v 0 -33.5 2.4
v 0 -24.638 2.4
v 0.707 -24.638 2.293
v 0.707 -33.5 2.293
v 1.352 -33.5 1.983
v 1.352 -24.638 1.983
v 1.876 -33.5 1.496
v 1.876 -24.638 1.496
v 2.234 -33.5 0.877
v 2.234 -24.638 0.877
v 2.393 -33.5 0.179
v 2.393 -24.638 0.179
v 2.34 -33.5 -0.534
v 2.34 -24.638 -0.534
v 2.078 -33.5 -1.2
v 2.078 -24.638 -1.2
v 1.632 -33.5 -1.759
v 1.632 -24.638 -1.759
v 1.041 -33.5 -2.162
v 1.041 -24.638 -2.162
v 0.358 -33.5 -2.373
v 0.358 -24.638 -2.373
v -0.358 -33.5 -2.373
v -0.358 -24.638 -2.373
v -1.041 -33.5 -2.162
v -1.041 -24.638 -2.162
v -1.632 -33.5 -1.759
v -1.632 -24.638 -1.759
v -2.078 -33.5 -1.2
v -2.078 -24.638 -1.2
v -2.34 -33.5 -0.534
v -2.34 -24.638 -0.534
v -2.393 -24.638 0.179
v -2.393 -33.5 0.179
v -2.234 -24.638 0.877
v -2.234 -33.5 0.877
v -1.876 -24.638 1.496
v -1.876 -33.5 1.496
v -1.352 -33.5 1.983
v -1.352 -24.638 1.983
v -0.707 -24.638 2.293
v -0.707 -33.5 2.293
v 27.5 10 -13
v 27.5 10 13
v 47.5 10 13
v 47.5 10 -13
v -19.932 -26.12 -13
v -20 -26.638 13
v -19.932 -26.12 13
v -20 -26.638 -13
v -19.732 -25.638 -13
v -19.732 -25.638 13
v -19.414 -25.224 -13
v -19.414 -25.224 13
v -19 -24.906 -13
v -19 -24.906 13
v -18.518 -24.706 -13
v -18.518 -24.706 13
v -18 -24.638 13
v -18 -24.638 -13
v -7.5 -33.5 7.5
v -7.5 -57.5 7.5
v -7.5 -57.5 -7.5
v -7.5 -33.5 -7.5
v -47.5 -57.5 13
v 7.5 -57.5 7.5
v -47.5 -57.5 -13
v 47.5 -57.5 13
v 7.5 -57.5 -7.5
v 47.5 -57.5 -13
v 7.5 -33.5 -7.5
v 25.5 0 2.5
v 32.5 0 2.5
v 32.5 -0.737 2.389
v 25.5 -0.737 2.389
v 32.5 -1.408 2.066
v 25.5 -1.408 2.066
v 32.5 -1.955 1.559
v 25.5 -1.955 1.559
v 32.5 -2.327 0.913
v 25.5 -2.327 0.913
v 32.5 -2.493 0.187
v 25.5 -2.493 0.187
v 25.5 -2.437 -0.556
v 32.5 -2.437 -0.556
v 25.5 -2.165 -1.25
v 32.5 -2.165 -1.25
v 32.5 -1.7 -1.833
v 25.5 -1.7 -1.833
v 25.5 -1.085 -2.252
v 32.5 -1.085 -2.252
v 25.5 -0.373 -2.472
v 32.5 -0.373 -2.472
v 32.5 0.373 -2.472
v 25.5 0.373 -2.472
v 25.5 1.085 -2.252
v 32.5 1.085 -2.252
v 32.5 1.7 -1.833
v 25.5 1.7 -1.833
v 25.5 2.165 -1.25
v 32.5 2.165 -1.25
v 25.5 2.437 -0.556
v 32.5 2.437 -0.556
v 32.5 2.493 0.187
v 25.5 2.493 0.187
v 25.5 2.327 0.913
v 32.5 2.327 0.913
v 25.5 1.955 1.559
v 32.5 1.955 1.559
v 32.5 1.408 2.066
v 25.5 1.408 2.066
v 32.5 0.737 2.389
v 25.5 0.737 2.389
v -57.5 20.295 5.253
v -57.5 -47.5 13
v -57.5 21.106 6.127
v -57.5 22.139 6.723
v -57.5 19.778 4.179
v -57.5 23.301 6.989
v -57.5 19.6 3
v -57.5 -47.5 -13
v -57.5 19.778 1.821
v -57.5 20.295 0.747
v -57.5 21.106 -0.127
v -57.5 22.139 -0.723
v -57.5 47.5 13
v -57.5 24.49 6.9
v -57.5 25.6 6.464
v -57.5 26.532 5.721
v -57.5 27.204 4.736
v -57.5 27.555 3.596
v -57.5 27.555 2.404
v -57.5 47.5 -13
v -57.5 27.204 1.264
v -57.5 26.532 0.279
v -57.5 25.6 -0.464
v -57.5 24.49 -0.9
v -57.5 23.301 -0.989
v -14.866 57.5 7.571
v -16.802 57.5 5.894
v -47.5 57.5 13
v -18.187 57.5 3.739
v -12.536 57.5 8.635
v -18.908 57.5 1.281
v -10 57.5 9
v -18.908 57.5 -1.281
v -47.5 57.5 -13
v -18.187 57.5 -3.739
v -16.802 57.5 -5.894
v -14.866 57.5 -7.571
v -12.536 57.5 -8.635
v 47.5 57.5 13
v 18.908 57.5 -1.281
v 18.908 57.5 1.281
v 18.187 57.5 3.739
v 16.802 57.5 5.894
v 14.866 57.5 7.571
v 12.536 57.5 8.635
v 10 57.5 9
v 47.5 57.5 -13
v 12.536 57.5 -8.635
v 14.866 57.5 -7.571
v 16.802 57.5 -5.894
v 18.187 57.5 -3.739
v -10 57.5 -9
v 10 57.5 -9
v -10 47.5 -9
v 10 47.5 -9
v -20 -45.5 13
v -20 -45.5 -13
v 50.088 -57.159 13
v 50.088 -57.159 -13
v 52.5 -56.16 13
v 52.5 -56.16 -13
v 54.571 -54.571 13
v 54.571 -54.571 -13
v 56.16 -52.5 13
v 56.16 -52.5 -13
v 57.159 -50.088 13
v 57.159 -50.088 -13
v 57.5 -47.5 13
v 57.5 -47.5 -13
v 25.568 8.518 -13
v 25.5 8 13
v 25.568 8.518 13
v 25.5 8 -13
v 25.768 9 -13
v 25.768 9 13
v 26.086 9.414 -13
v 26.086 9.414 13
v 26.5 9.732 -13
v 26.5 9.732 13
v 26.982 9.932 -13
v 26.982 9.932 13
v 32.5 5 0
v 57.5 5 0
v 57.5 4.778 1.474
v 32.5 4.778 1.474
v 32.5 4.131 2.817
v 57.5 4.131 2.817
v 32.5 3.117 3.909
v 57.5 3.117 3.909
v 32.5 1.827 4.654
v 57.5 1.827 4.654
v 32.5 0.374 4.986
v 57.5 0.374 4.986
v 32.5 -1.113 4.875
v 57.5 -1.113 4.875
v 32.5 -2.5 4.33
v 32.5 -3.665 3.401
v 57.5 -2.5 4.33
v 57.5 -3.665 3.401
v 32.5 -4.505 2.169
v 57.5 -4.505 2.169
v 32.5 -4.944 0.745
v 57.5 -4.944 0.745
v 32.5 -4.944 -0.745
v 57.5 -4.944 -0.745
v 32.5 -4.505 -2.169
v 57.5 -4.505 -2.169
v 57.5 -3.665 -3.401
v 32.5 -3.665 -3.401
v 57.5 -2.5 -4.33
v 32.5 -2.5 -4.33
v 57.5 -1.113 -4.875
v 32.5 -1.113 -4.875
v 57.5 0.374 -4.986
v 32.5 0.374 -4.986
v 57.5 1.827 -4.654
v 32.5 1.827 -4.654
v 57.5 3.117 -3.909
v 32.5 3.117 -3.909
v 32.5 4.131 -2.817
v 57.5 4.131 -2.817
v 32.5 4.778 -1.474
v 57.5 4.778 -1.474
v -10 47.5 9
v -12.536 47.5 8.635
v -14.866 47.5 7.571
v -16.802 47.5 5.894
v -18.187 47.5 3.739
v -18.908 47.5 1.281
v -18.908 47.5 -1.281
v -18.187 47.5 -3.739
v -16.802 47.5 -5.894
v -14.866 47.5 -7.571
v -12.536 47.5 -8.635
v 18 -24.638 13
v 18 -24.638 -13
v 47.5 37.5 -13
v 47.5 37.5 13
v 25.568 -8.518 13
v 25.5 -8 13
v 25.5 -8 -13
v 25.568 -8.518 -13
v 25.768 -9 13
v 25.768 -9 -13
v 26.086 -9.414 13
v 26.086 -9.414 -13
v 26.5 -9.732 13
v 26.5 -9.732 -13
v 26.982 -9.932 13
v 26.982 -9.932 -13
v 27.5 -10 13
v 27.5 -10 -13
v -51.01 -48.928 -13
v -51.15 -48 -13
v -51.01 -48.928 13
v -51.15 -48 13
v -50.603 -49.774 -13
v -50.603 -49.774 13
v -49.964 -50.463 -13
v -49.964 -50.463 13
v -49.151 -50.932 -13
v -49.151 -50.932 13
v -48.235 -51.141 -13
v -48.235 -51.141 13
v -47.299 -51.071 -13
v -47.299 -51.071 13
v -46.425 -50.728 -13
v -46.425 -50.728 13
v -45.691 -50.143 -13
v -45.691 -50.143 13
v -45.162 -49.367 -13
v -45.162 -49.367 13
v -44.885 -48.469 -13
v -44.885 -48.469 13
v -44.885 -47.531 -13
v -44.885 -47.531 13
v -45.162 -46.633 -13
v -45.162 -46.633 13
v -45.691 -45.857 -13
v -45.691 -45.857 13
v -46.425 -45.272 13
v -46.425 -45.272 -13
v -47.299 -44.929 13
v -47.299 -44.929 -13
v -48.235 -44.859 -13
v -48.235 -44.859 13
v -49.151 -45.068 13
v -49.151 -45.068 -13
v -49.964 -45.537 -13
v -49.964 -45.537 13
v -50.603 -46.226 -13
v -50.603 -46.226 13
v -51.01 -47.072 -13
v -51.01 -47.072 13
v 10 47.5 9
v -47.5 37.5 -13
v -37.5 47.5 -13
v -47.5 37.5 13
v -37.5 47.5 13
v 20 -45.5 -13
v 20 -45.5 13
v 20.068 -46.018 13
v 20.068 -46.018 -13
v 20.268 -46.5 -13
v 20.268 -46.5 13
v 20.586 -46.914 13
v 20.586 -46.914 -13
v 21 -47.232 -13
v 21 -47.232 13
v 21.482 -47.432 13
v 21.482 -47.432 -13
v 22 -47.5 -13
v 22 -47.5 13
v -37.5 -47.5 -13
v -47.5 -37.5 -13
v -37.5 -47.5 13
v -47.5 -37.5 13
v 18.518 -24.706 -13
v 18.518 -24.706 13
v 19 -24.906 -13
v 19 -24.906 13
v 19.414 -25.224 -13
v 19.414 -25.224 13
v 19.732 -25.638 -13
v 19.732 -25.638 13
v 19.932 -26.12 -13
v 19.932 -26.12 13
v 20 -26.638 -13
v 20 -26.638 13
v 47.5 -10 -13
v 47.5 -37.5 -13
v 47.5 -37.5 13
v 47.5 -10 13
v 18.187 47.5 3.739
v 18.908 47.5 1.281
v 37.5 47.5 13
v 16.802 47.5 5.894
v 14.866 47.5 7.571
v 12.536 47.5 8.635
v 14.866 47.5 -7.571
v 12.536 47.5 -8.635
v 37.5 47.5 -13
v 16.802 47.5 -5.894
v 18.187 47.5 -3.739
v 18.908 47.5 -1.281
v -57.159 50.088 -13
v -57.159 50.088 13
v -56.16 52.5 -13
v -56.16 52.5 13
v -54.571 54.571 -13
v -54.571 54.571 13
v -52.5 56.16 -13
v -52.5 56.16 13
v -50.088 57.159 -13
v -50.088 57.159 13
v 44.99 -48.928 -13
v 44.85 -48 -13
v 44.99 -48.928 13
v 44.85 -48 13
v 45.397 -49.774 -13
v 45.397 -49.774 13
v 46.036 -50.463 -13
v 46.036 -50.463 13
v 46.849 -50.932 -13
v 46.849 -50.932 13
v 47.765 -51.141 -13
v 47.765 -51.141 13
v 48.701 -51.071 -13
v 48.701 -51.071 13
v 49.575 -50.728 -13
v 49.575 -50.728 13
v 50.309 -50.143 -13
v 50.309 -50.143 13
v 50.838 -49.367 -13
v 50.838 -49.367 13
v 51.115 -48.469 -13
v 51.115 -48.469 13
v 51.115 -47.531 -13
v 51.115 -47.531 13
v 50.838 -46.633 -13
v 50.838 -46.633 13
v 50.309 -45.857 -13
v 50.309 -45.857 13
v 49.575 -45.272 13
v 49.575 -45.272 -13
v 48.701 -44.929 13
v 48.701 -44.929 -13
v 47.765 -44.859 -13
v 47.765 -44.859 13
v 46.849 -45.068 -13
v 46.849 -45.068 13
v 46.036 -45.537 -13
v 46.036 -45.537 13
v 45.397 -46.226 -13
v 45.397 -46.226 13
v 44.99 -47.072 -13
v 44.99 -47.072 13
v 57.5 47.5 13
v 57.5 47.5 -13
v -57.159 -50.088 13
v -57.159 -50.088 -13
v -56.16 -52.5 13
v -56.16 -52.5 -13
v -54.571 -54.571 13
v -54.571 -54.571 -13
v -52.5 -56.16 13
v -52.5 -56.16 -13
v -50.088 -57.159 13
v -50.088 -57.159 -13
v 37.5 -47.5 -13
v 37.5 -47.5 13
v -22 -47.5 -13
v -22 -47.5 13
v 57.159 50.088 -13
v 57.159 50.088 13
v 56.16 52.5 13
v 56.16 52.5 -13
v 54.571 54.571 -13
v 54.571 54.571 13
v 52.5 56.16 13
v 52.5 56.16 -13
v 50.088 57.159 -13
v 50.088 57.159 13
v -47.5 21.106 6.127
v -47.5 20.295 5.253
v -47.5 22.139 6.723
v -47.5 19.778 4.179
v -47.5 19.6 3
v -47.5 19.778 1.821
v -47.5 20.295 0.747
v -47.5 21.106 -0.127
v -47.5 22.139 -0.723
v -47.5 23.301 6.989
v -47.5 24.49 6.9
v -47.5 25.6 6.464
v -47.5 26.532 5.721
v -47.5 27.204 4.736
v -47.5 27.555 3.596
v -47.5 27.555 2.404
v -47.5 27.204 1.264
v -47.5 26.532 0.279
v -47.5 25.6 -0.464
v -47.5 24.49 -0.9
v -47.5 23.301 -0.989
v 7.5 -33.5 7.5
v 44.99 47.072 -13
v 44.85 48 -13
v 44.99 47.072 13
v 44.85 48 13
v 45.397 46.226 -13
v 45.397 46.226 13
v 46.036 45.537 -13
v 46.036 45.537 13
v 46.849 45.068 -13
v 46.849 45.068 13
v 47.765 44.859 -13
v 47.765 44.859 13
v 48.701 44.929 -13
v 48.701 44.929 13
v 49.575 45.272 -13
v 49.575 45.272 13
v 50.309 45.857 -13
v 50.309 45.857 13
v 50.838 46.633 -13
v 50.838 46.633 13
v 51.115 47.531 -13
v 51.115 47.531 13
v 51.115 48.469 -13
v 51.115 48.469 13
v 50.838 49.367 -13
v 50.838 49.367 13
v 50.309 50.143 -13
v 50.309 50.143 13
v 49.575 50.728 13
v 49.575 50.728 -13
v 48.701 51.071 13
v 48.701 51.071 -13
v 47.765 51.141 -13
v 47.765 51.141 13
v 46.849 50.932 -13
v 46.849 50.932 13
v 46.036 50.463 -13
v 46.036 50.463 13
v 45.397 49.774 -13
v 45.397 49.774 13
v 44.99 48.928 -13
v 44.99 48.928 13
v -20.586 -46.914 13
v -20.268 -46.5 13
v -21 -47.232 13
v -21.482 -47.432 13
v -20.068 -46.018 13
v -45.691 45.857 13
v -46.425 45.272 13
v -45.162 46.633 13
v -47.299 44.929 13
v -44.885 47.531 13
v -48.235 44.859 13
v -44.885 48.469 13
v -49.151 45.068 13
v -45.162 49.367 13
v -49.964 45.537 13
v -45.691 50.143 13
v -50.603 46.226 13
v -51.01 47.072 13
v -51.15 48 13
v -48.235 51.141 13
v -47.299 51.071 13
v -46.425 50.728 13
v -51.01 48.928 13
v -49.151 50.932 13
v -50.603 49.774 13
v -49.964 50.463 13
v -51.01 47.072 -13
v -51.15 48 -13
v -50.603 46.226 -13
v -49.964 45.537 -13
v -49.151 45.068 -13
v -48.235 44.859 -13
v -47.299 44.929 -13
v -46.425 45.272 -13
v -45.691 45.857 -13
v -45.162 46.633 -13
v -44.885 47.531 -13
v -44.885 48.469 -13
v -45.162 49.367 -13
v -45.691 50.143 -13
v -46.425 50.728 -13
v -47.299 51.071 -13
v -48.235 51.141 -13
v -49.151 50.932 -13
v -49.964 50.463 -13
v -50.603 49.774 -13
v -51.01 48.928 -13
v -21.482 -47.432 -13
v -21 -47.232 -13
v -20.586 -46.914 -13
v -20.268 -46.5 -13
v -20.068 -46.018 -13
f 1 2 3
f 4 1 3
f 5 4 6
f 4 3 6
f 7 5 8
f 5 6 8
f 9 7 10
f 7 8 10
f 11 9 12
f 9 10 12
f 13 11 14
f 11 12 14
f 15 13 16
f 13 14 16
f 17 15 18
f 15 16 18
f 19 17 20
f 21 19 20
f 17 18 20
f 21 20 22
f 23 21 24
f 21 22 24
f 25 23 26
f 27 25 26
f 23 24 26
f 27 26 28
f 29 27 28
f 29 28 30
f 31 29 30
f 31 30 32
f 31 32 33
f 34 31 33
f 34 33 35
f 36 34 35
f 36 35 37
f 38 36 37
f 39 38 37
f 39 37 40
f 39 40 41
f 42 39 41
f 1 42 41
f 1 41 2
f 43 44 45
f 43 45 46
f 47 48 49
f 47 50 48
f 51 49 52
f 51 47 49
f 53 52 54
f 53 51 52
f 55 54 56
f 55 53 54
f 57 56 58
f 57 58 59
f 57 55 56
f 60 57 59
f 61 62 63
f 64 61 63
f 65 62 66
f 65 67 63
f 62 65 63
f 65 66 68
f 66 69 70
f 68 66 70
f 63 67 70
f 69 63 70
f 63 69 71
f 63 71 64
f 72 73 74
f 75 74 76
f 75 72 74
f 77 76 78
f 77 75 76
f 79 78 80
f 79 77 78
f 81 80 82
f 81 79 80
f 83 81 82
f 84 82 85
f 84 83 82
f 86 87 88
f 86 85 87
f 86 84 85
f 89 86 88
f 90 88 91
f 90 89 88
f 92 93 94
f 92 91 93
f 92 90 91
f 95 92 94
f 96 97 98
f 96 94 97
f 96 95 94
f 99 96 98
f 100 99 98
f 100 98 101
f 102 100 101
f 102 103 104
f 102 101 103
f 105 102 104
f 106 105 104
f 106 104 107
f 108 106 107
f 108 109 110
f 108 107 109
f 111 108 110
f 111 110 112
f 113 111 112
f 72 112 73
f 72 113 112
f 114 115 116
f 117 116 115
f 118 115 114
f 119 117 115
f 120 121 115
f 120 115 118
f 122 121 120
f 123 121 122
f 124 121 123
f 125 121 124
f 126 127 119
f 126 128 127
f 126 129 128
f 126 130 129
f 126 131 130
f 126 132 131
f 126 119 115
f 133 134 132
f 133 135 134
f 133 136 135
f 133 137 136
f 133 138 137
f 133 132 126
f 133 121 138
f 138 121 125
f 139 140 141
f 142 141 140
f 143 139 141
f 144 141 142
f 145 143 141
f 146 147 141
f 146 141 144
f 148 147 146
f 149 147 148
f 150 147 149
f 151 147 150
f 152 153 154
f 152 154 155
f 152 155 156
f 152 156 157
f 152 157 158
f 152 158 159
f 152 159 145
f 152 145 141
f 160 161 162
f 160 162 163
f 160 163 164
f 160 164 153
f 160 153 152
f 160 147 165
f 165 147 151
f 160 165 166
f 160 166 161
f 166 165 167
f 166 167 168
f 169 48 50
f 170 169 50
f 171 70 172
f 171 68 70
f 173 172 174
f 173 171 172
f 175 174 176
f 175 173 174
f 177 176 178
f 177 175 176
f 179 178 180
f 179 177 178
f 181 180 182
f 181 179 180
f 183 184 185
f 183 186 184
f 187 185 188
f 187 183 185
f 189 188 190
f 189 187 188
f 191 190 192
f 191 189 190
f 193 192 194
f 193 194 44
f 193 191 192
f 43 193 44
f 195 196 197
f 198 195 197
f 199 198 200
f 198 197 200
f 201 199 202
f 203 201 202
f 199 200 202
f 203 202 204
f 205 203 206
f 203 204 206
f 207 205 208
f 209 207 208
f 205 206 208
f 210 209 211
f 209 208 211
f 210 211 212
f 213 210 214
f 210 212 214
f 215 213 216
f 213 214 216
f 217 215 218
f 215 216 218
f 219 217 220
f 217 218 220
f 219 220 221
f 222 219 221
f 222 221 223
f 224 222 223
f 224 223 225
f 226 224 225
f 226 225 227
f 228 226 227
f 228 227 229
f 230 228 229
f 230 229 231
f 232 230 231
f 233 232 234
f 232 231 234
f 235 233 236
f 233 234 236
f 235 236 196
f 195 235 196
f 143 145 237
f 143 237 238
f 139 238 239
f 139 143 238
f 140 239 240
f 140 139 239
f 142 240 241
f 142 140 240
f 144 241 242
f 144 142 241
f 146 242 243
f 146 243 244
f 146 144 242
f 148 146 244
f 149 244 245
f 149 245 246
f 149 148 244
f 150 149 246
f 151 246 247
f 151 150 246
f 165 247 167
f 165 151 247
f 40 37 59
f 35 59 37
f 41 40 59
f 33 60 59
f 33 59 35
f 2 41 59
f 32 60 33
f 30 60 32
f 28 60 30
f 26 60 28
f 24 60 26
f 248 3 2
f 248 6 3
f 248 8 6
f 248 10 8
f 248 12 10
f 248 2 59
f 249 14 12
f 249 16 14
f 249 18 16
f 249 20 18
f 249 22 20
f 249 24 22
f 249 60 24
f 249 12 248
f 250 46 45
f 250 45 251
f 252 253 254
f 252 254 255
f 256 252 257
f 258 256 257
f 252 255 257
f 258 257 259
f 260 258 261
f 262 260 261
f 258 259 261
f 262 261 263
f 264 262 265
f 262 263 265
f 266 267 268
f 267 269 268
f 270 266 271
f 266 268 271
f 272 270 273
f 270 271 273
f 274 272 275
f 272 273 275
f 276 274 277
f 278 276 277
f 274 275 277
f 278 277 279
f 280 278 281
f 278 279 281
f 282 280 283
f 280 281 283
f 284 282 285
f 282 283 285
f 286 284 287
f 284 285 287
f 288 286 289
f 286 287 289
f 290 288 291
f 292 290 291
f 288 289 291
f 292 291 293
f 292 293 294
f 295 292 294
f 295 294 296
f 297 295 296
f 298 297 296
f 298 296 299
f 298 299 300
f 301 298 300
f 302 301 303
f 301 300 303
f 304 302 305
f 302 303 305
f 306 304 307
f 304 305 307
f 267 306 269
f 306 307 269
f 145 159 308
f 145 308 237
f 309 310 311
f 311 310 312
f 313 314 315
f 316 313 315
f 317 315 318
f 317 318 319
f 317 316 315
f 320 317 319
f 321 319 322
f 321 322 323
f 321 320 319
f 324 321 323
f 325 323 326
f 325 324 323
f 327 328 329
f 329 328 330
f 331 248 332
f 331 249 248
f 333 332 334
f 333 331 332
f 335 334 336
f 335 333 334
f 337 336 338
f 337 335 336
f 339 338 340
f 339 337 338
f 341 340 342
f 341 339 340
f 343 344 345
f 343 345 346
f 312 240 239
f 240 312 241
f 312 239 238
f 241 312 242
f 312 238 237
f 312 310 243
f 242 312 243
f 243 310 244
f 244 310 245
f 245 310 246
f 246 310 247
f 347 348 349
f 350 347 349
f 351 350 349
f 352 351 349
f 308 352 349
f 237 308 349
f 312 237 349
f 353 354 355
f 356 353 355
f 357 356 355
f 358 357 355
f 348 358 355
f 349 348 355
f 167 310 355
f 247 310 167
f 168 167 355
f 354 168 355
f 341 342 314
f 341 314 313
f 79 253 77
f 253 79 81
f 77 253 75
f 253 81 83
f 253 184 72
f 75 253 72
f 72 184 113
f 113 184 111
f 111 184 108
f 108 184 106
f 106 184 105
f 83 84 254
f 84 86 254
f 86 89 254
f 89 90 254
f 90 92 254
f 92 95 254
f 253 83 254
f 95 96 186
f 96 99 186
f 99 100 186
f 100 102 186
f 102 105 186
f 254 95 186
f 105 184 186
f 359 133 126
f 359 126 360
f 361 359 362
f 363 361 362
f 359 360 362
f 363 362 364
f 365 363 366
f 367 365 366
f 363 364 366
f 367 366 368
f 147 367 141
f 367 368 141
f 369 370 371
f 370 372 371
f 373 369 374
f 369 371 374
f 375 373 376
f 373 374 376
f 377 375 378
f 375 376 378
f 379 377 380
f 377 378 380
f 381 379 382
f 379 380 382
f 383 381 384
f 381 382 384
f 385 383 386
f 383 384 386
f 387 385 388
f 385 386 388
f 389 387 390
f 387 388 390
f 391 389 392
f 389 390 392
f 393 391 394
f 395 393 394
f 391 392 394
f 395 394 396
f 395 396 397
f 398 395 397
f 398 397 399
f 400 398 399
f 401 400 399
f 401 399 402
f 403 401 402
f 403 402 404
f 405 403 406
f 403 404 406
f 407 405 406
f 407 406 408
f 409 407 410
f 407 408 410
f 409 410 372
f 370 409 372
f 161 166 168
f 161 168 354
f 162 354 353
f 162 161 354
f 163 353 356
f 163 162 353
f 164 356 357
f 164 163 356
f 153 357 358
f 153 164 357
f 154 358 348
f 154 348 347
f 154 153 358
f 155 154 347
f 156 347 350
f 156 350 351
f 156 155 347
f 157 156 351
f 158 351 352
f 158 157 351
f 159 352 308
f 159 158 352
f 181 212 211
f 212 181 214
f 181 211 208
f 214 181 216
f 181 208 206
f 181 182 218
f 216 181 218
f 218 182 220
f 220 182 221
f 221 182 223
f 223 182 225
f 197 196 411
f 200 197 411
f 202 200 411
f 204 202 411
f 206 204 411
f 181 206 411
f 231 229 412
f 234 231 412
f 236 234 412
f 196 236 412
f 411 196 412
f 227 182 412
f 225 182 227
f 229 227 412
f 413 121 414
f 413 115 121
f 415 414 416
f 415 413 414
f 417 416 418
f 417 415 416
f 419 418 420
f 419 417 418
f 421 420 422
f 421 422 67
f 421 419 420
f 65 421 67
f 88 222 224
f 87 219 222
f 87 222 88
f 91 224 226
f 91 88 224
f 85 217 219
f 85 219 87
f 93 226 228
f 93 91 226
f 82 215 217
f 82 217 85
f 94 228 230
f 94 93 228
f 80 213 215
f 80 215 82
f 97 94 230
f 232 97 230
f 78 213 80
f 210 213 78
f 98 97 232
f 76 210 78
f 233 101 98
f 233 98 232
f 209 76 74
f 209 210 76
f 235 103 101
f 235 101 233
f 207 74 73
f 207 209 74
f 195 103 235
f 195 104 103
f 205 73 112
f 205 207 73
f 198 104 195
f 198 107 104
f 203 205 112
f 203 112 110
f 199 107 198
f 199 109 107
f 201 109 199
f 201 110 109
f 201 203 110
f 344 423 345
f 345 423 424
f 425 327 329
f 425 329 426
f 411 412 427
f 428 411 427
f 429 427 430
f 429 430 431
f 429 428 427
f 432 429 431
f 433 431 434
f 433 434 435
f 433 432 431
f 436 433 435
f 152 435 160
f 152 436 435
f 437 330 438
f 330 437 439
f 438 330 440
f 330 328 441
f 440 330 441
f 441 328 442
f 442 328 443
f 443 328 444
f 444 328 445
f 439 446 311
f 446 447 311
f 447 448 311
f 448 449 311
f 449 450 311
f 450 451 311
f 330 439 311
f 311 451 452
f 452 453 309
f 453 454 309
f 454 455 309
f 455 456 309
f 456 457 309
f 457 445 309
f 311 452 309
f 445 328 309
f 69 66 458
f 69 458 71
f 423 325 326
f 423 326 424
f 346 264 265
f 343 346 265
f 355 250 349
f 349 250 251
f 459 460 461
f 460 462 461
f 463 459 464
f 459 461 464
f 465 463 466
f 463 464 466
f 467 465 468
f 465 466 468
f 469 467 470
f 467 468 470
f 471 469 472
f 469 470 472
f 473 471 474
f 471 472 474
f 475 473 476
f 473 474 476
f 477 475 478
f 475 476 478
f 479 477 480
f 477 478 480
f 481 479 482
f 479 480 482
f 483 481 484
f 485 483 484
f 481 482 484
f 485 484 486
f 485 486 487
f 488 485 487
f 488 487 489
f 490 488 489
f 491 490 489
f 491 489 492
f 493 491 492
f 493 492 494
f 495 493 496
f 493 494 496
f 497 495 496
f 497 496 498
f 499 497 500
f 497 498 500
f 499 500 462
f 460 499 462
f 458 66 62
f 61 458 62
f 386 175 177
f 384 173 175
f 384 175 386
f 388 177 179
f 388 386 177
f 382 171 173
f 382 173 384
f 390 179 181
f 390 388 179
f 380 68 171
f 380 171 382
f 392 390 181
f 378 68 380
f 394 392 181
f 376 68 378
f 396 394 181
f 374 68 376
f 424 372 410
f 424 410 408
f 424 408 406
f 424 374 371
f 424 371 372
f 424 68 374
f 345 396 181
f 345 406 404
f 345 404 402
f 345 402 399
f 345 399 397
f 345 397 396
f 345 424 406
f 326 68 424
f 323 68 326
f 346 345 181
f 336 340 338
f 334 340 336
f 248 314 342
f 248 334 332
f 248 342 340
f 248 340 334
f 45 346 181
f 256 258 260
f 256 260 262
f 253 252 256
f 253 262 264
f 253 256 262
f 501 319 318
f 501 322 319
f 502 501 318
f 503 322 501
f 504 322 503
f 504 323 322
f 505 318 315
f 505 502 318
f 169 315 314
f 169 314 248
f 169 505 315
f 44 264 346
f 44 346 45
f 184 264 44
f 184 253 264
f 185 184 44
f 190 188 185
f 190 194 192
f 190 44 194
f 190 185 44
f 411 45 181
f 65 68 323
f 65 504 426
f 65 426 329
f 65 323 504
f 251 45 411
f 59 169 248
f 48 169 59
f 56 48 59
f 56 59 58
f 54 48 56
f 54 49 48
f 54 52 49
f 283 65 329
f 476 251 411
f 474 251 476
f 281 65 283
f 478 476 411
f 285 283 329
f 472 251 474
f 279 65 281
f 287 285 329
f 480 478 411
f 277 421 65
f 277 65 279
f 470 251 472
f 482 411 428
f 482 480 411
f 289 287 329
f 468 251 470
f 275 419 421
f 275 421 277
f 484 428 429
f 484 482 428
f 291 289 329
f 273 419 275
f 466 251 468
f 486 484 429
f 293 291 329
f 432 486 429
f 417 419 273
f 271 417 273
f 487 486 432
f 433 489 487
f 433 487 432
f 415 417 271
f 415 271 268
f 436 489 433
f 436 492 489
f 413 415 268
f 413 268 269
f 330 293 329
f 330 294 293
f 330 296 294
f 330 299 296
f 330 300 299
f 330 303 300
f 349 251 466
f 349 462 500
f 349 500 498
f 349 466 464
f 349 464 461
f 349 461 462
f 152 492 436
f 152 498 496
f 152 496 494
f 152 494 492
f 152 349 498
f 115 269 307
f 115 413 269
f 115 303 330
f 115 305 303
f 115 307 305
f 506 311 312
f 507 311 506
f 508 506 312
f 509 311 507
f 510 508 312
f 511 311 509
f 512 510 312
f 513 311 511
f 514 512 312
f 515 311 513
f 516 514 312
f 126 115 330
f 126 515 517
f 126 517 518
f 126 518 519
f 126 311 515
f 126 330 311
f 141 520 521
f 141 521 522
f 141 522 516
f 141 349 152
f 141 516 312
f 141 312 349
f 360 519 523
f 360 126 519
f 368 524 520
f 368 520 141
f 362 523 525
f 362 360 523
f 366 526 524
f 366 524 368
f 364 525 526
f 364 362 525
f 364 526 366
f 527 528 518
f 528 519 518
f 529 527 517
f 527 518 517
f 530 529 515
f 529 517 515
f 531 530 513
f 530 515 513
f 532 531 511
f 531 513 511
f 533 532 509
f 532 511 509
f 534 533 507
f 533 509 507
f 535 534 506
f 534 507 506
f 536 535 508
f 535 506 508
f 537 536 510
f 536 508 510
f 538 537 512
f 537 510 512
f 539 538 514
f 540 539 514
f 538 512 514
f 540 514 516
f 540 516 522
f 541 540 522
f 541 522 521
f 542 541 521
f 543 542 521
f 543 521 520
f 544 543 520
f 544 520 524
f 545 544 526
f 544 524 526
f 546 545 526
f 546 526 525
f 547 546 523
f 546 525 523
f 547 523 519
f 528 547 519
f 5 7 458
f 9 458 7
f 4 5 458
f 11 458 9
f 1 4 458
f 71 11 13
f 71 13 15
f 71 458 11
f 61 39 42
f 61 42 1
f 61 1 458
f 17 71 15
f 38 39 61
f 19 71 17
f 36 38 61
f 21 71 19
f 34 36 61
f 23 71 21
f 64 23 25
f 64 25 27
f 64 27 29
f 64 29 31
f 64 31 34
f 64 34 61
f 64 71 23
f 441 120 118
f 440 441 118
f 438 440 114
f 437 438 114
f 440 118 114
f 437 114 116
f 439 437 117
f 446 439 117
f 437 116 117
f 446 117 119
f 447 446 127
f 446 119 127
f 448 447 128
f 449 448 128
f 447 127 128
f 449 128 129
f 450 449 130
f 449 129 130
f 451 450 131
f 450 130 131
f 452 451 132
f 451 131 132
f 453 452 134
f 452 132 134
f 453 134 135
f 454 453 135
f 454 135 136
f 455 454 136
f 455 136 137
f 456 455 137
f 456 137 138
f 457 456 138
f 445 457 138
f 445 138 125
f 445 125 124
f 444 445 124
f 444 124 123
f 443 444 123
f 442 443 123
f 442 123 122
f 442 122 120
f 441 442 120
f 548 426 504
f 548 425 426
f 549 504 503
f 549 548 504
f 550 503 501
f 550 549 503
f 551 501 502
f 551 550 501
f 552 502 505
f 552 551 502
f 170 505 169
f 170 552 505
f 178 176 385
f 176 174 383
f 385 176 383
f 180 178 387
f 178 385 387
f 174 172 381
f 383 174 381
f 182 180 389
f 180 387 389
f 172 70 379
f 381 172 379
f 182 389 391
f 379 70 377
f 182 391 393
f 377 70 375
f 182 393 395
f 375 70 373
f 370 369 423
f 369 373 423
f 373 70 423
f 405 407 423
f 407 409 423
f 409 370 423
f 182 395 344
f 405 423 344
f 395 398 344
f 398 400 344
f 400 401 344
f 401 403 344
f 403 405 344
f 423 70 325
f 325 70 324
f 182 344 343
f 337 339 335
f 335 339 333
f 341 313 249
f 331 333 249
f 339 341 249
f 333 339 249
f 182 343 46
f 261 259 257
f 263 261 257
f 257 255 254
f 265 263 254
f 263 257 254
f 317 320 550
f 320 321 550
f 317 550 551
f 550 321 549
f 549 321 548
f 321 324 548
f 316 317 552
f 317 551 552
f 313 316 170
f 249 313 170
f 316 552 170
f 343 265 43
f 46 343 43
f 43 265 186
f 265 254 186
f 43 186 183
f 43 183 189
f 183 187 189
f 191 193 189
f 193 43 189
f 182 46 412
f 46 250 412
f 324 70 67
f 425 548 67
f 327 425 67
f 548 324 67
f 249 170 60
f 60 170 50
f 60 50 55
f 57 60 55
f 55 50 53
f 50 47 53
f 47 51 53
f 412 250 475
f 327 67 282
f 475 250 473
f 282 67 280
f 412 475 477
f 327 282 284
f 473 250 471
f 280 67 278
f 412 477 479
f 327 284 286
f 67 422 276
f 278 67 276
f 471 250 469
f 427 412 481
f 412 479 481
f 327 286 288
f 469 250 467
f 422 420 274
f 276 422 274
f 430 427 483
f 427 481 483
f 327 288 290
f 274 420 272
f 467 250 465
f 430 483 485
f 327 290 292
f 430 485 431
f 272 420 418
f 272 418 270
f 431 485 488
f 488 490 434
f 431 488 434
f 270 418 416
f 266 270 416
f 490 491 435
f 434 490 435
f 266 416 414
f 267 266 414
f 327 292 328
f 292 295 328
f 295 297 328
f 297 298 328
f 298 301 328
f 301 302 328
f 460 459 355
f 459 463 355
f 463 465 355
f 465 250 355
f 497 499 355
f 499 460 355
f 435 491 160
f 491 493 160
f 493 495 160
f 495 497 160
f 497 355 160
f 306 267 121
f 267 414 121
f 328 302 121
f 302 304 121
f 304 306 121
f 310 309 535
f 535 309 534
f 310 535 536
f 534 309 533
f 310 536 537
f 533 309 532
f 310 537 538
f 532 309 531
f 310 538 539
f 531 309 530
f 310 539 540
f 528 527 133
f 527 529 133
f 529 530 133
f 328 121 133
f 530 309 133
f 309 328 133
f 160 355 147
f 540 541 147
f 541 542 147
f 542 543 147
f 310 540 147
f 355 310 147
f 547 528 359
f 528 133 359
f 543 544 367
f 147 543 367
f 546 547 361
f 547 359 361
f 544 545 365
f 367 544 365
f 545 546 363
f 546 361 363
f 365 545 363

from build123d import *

# Parameters (mm, degrees)
SKETCH1_W           = 115
SKETCH1_H           = 115
SKETCH1_W_2         = 95
SKETCH1_H_2         = 95
BOSS_EXTRUDE1_DEPTH = 26
SKETCH10_W          = 40
SKETCH10_H          = 26
BOSS_EXTRUDE4_DEPTH = 27
SKETCH3_W           = 15
SKETCH3_H           = 15
CUT_EXTRUDE1_DEPTH  = 24
FILLET1_R           = 10
CHAMFER1_SIZE       = 10
SKETCH4_R           = 3.15
CUT_EXTRUDE3_DEPTH  = 57.5
SKETCH9_R           = 4
CUT_EXTRUDE7_DEPTH  = 30
FILLET5_R           = 2
SKETCH11_W          = 26
SKETCH11_H          = 20
BOSS_EXTRUDE5_DEPTH = 25
FILLET6_R           = 2
SKETCH13_R          = 5
CUT_EXTRUDE9_DEPTH  = 25
SKETCH14_R          = 2.5
CUT_EXTRUDE10_DEPTH = 15
CUT_EXTRUDE11_DEPTH = 10
SKETCH16_R          = 2.4
CUT_EXTRUDE12_DEPTH = 30


with BuildPart() as part:
    # Sketch1 → Boss-Extrude1 (new body)
    with BuildSketch(Plane.XY.offset(-13)):
        Rectangle(SKETCH1_W, SKETCH1_H)
        Rectangle(SKETCH1_W_2, SKETCH1_H_2, mode=Mode.SUBTRACT)
    extrude(amount=BOSS_EXTRUDE1_DEPTH)

    # Sketch10 → Boss-Extrude4 (add)
    with BuildSketch(Plane(origin=(0, -24.638, 0), x_dir=(1, 0, 0), z_dir=(0, 1, 0))):
        Rectangle(SKETCH10_W, SKETCH10_H)
    extrude(amount=-BOSS_EXTRUDE4_DEPTH)

    # Sketch3 → Cut-Extrude1 (cut)
    with BuildSketch(Plane(origin=(0, -57.5, 0), x_dir=(-1, 0, 0), z_dir=(0, -1, 0))):
        Rectangle(SKETCH3_W, SKETCH3_H)
    extrude(amount=-CUT_EXTRUDE1_DEPTH, mode=Mode.SUBTRACT)

    # Fillet1
    fillet1_edges = [part.edges().sort_by_distance(p)[0] for p in [
        (-57.5, 57.5, 0),
        (57.5, 57.5, 0),
        (57.5, -57.5, 0),
        (-57.5, -57.5, 0),
    ]]
    fillet(fillet1_edges, radius=FILLET1_R)

    # Chamfer1
    chamfer1_edges = [part.edges().sort_by_distance(p)[0] for p in [
        (-47.5, 47.5, 0),
        (-47.5, -47.5, 0),
        (47.5, -47.5, 0),
        (47.5, 47.5, 0),
    ]]
    chamfer(chamfer1_edges, length=CHAMFER1_SIZE)

    # Sketch4 → Cut-Extrude3 (cut, symmetric)
    with BuildSketch(Plane.XY):
        with Locations(Location((-48, 48, 0), (0, 0, 180))):
            Circle(SKETCH4_R)
        with Locations(Location((48, 48, 0), (0, 0, 180))):
            Circle(SKETCH4_R)
        with Locations(Location((48, -48, 0), (0, 0, 180))):
            Circle(SKETCH4_R)
        with Locations(Location((-48, -48, 0), (0, 0, 180))):
            Circle(SKETCH4_R)
    extrude(amount=CUT_EXTRUDE3_DEPTH, both=True, mode=Mode.SUBTRACT)

    # Sketch9 → Cut-Extrude7 (cut)
    with BuildSketch(Plane.ZY.offset(57.5)):
        with Locations(Location((3, 23.6, 0), (0, 0, 270))):
            Circle(SKETCH9_R)
    extrude(amount=-CUT_EXTRUDE7_DEPTH, mode=Mode.SUBTRACT)

    # Fillet5
    fillet5_edges = [part.edges().sort_by_distance(p)[0] for p in [
        (20, -47.5, 0),
        (-20, -47.5, 0),
        (-20, -24.638, 0),
        (20, -24.638, 0),
    ]]
    fillet(fillet5_edges, radius=FILLET5_R)

    # Sketch11 → Boss-Extrude5 (add)
    with BuildSketch(Plane(origin=(25.5, 0, 0), x_dir=(0, 0, -1), z_dir=(1, 0, 0))):
        Rectangle(SKETCH11_W, SKETCH11_H)
    extrude(amount=BOSS_EXTRUDE5_DEPTH)

    # Fillet6
    fillet6_edges = [part.edges().sort_by_distance(p)[0] for p in [
        (25.5, -10, 0),
        (25.5, 10, 0),
    ]]
    fillet(fillet6_edges, radius=FILLET6_R)

    # Sketch13 → Cut-Extrude9 (cut)
    with BuildSketch(Plane(origin=(57.5, 0, 0), x_dir=(0, 0, -1), z_dir=(1, 0, 0))):
        with Locations(Location((0, 0, 0), (0, 0, 90))):
            Circle(SKETCH13_R)
    extrude(amount=-CUT_EXTRUDE9_DEPTH, mode=Mode.SUBTRACT)

    # Sketch14 → Cut-Extrude10 (cut)
    with BuildSketch(Plane(origin=(25.5, 0, 0), x_dir=(0, 0, -1), z_dir=(1, 0, 0))):
        with Locations(Location((0, 0, 0), (0, 0, 180))):
            Circle(SKETCH14_R)
    extrude(amount=CUT_EXTRUDE10_DEPTH, mode=Mode.SUBTRACT)

    # Sketch15 → Cut-Extrude11 (cut)
    with BuildSketch(Plane(origin=(0, 57.5, 0), x_dir=(1, 0, 0), z_dir=(0, 1, 0))):
        with BuildLine():
            Line((-10, 9), (10, 9))
            ThreePointArc((10, 9), (19, 0), (10, -9))
            Line((10, -9), (-10, -9))
            ThreePointArc((-10, -9), (-19, 0), (-10, 9))
        make_face()
    extrude(amount=-CUT_EXTRUDE11_DEPTH, mode=Mode.SUBTRACT)

    # Sketch16 → Cut-Extrude12 (cut)
    with BuildSketch(Plane(origin=(0, -24.638, 0), x_dir=(1, 0, 0), z_dir=(0, 1, 0))):
        with Locations(Location((0, 0, 0), (0, 0, 270))):
            Circle(SKETCH16_R)
    extrude(amount=-CUT_EXTRUDE12_DEPTH, mode=Mode.SUBTRACT)


solid = part.part
